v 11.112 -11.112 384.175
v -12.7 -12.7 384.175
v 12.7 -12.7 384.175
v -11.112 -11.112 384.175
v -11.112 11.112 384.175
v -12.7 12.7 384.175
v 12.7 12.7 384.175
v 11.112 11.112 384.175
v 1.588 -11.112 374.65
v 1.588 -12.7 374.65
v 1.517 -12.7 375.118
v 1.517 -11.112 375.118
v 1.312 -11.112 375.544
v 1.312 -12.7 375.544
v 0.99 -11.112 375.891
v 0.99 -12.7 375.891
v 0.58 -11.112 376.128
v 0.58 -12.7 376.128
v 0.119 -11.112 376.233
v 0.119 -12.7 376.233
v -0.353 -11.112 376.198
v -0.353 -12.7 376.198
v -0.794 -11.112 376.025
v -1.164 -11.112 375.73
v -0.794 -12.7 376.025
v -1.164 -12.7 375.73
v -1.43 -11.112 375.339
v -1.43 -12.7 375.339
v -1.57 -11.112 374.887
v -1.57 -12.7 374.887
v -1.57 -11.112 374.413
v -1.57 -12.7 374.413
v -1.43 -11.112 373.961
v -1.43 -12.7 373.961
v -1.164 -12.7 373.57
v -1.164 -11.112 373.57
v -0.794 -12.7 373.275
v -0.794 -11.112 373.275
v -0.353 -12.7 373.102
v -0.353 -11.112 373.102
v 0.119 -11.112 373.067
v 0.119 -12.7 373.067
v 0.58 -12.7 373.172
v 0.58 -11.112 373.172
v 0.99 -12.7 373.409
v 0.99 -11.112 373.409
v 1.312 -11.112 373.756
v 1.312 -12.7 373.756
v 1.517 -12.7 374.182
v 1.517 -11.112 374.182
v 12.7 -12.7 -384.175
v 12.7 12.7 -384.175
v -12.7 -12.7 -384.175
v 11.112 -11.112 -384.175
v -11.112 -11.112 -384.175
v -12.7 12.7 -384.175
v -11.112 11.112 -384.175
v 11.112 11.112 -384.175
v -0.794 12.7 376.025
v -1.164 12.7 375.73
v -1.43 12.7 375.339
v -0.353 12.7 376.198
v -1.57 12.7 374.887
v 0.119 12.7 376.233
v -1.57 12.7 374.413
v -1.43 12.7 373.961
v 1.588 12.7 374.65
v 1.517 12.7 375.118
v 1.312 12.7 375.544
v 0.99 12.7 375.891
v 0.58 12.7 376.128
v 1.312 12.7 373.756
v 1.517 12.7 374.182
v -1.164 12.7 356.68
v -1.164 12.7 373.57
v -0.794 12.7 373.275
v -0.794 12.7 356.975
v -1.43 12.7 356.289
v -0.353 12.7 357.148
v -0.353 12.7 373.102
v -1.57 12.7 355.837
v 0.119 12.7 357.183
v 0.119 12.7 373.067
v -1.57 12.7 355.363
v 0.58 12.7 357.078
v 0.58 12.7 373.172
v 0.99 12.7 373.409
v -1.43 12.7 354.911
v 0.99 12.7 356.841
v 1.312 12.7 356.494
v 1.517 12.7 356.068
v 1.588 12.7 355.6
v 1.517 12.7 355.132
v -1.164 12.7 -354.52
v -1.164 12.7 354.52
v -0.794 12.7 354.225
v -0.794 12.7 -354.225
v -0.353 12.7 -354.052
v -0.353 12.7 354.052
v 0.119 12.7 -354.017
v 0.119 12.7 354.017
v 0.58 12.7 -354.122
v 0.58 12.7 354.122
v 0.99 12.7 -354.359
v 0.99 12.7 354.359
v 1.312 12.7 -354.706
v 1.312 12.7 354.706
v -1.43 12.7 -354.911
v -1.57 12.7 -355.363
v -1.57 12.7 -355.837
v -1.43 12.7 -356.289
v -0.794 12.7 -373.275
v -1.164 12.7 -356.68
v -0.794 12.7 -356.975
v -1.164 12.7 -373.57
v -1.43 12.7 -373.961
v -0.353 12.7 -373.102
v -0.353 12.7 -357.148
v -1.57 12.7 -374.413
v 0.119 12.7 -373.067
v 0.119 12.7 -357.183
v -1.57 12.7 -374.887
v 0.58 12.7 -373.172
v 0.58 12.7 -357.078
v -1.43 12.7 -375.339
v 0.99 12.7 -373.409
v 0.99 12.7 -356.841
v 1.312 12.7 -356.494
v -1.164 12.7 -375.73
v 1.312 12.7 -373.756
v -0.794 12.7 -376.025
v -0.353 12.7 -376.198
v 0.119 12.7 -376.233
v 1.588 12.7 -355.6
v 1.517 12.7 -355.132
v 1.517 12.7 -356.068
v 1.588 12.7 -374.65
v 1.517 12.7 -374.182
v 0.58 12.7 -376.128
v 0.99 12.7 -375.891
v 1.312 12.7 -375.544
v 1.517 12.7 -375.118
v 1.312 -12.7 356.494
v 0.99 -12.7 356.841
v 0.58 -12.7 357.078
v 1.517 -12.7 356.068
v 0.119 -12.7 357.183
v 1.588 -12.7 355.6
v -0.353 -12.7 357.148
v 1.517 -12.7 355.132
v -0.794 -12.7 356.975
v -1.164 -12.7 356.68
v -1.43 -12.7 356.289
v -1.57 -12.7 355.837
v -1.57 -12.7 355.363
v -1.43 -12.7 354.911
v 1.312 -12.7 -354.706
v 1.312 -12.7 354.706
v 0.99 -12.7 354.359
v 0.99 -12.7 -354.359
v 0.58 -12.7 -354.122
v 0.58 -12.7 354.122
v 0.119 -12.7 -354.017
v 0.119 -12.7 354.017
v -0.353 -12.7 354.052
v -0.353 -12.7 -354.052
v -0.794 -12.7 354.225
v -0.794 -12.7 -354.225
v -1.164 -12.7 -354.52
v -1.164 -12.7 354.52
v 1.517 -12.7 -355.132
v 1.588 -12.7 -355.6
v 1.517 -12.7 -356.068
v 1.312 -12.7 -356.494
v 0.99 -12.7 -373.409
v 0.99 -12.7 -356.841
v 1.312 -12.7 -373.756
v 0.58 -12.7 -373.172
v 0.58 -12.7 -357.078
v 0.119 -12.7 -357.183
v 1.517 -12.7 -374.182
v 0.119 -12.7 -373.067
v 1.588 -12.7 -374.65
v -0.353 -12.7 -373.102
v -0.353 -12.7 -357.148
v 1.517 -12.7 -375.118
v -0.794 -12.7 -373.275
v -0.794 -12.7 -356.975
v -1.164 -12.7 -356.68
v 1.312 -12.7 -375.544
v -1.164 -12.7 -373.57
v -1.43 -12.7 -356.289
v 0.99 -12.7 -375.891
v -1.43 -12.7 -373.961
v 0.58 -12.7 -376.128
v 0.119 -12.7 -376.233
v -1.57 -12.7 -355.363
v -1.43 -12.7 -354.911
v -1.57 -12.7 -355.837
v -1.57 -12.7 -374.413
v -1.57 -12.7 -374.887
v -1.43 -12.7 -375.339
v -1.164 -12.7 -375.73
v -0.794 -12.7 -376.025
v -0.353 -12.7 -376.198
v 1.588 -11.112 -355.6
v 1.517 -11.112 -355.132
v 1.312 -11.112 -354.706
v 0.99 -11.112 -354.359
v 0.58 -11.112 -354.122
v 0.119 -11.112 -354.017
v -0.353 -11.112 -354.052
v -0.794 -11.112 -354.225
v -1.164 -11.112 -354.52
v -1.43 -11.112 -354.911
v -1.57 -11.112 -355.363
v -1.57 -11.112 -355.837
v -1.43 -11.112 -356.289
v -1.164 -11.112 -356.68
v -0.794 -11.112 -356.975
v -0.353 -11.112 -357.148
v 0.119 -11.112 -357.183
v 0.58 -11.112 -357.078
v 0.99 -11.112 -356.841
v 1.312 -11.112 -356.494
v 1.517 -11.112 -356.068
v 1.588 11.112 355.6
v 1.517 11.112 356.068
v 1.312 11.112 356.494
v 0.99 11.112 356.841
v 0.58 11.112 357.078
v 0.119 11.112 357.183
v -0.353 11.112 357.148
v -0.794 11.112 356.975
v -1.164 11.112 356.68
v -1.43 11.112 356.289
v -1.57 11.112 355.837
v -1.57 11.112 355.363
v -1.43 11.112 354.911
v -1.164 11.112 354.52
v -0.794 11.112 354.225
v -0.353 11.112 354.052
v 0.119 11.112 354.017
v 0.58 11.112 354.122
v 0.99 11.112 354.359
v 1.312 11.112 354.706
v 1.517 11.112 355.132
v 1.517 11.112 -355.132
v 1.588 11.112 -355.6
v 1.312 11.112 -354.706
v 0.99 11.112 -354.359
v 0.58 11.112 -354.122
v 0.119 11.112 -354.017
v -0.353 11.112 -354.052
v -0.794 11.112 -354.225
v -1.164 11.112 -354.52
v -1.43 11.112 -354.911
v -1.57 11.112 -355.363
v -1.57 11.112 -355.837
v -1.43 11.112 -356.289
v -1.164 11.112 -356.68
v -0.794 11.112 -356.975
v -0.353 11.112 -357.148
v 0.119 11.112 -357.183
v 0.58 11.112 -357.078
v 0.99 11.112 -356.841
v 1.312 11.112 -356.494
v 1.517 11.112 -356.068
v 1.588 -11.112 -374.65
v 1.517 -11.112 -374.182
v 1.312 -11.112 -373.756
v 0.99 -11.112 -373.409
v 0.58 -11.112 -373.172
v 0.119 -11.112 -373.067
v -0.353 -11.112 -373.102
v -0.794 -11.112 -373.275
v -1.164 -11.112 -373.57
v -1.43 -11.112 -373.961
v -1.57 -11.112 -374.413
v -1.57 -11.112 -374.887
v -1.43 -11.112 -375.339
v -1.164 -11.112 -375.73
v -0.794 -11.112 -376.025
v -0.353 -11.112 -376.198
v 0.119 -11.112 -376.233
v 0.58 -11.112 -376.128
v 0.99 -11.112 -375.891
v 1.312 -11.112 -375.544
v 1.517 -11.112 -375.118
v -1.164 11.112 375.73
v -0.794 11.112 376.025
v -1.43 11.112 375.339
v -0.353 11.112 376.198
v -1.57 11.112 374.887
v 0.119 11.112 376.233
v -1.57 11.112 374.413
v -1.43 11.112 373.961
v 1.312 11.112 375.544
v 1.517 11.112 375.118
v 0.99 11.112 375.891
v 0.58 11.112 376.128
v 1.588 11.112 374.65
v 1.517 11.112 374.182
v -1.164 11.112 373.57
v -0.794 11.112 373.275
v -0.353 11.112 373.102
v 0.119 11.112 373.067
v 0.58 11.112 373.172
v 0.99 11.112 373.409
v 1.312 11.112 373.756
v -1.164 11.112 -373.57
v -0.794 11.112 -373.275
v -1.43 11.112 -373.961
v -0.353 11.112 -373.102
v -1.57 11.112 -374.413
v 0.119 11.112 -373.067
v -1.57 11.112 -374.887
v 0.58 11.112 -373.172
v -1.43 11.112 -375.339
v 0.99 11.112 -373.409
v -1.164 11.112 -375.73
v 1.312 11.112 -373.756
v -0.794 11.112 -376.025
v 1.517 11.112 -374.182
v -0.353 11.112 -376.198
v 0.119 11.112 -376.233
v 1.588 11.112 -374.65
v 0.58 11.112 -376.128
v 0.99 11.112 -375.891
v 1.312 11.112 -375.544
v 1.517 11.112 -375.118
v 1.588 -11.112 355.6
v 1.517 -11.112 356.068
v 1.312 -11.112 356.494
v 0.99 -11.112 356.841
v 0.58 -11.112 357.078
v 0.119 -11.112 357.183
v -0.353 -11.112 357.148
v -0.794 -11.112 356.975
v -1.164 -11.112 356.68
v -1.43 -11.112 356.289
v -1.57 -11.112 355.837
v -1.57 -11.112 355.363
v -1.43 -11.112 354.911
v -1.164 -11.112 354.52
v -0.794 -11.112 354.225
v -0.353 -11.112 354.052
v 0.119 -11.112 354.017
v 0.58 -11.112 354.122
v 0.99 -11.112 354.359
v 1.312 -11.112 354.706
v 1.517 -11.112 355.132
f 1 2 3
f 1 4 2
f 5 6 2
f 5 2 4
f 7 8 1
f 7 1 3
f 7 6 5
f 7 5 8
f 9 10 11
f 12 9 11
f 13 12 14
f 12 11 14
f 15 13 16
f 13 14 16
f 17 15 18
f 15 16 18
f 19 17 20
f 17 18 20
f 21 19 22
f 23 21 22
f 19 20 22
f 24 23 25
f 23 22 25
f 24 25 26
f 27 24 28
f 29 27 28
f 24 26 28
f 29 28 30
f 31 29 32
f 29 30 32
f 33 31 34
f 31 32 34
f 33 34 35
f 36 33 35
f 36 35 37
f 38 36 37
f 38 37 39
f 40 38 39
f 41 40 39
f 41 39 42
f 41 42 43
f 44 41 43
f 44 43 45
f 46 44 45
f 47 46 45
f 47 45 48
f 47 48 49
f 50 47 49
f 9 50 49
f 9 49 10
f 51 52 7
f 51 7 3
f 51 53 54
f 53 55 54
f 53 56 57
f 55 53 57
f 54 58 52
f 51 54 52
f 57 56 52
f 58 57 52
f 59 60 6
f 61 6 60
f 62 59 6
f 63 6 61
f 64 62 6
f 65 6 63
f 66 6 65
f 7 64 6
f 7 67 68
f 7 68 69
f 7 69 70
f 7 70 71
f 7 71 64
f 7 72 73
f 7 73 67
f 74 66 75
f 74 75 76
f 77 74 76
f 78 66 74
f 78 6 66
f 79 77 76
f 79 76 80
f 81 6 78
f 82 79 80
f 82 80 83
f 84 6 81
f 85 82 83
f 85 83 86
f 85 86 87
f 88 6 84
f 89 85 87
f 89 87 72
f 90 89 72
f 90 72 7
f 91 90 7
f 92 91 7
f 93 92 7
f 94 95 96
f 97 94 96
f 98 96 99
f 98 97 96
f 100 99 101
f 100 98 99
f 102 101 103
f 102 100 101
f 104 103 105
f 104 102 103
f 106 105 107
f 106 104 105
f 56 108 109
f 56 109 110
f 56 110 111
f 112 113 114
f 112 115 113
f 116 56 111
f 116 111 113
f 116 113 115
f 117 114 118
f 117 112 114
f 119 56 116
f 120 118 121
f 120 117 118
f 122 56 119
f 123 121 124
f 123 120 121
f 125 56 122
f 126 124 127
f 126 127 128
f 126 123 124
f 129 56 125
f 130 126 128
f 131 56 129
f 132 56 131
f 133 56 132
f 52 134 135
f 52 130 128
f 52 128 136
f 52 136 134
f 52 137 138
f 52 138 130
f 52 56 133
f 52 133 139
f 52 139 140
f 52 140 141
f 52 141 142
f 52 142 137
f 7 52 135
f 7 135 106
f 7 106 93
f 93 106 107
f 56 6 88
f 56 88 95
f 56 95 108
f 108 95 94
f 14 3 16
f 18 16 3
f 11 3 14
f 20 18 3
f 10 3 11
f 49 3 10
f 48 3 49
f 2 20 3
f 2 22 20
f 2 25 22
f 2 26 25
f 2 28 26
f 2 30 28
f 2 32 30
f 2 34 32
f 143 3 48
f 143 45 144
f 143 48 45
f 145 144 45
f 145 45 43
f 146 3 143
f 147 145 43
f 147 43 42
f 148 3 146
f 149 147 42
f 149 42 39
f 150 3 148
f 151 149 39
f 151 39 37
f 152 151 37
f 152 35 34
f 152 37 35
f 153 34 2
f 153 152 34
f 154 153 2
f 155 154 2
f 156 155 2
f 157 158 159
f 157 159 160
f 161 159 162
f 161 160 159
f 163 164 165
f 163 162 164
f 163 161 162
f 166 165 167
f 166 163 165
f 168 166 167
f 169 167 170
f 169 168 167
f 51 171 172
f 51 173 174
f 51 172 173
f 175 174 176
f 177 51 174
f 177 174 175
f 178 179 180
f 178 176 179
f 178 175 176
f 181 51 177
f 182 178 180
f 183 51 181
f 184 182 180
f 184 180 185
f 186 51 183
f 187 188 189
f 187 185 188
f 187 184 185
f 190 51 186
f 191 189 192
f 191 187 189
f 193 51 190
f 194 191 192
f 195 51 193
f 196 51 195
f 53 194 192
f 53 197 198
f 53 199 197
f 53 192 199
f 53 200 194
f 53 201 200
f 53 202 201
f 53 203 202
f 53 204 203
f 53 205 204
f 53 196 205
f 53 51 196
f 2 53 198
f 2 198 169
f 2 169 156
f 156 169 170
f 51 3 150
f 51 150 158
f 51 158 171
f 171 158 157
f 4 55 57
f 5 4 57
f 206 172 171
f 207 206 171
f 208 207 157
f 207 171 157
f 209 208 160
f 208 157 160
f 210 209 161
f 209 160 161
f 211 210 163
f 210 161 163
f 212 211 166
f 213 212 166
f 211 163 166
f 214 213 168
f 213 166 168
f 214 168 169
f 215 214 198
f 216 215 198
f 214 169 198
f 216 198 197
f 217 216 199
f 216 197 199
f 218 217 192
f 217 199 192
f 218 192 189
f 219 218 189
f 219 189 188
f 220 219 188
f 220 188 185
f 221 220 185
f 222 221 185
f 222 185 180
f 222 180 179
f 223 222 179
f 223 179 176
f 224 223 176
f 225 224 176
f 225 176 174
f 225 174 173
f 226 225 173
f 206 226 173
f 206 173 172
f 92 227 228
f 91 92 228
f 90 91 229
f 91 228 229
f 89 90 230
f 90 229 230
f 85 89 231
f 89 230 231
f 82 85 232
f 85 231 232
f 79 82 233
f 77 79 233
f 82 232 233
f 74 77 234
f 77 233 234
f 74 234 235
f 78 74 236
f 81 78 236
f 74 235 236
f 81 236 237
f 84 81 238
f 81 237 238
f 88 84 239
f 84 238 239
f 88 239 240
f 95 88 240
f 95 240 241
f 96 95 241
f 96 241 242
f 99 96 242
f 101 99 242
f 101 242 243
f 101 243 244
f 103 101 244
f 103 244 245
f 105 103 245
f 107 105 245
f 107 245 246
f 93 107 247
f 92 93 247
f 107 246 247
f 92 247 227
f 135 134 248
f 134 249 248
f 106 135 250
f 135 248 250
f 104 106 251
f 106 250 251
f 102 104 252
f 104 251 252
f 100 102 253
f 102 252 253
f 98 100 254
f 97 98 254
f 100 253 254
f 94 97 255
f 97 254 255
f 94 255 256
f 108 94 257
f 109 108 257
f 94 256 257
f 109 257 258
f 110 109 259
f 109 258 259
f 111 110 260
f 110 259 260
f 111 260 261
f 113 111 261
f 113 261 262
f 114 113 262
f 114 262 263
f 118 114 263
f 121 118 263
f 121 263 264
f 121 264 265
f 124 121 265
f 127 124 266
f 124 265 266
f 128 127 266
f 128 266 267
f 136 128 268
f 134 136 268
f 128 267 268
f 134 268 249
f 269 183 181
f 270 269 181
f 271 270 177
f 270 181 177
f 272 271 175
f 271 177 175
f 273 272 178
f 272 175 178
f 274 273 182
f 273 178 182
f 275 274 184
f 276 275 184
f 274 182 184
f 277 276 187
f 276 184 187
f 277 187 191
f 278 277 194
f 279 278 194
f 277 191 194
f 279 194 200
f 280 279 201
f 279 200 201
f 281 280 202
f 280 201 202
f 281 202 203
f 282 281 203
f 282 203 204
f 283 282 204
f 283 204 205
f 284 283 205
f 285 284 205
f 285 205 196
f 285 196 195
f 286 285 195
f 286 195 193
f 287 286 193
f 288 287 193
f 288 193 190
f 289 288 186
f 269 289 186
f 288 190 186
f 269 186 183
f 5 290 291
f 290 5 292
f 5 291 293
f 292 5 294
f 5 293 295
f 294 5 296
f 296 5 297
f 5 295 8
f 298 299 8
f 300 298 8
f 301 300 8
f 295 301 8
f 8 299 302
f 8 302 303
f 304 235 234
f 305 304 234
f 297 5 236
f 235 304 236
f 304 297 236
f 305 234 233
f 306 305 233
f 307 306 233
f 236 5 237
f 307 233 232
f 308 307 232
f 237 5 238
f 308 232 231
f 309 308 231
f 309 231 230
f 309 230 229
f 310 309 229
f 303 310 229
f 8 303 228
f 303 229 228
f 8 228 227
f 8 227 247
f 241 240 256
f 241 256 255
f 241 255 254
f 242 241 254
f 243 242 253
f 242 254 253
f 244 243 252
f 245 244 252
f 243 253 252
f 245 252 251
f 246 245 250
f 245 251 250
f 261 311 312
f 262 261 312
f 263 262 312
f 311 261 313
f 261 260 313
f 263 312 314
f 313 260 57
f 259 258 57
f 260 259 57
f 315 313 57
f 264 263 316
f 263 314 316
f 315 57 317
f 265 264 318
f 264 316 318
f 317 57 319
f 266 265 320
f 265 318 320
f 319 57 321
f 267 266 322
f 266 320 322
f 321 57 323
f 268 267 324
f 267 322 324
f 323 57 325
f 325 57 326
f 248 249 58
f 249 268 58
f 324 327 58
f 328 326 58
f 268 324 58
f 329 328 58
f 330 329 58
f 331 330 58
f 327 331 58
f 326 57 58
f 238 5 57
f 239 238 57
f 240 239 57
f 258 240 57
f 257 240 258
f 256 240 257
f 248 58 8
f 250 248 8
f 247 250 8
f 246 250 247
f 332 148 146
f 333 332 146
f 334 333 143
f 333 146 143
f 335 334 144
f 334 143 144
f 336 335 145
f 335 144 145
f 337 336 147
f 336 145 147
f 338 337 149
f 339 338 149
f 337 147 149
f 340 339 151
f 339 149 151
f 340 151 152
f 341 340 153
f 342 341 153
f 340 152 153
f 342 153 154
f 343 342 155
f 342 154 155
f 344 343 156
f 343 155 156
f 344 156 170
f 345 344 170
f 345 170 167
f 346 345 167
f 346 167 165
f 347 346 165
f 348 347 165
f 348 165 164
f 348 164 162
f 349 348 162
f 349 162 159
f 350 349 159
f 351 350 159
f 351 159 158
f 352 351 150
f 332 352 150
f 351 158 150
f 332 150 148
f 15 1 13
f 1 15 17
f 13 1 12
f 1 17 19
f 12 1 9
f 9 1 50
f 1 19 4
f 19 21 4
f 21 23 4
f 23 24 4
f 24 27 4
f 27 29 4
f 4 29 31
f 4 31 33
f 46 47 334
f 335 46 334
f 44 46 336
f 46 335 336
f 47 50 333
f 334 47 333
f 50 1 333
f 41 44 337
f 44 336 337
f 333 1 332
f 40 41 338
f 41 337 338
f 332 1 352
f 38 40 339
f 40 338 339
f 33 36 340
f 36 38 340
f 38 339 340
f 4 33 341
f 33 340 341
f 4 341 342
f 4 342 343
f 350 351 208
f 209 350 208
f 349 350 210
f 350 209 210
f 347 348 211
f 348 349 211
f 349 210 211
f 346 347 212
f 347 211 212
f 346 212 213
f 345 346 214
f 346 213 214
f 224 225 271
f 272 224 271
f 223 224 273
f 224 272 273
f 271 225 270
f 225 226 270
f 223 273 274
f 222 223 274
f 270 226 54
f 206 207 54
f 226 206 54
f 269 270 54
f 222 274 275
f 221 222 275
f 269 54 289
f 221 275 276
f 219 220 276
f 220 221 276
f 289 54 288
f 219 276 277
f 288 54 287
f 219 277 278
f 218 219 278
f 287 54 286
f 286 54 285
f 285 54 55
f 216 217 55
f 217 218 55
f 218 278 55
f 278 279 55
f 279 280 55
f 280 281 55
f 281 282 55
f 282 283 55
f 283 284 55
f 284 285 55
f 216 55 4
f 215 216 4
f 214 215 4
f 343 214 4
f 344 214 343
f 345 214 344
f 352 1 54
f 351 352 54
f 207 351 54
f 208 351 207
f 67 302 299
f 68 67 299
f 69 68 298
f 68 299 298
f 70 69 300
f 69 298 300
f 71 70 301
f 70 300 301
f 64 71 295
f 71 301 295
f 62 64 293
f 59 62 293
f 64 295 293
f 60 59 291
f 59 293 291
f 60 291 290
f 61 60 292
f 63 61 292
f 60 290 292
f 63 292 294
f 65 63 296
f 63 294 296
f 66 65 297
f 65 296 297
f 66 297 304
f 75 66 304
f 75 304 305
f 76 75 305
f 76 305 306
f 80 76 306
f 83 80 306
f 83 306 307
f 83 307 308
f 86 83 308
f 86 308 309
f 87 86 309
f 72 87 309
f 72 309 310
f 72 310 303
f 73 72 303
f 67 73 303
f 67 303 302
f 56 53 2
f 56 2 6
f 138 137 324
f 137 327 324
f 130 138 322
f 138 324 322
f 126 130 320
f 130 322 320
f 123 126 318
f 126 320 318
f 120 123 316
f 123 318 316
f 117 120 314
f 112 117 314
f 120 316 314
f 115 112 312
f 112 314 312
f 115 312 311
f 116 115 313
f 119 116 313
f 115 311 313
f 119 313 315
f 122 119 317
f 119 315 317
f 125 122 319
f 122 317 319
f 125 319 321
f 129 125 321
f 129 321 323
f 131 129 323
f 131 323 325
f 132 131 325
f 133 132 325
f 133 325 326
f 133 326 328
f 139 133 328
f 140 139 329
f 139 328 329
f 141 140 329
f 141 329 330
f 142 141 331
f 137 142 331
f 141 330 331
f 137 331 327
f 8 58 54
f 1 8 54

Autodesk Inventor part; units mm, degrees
ref_plane "YZ Plane" through (0, 0, 0) normal (1, 0, 0) x (0, 1, 0)
ref_plane "XZ Plane" through (0, 0, 0) normal (0, 1, 0) x (-1, 0, 0)
ref_plane "XY Plane" through (0, 0, 0) normal (0, 0, 1) x (1, 0, 0)
sketch "Sketch1" plane through (0, 0, 0) normal (0, 0, 1) x (1, 0, 0)
  line L0 (0, 0) -> (-11.1125, 0) construction
  line L1 (0, 0) -> (0, 11.1125) construction
  line L2 (-11.1125, 11.1125) -> (11.1125, 11.1125)
  line L3 (11.1125, 11.1125) -> (11.1125, -11.1125)
  line L4 (11.1125, -11.1125) -> (-11.1125, -11.1125)
  line L5 (-11.1125, -11.1125) -> (-11.1125, 11.1125)
  line L6 (-12.7, 12.7) -> (12.7, 12.7)
  line L7 (12.7, 12.7) -> (12.7, -12.7)
  line L8 (12.7, -12.7) -> (-12.7, -12.7)
  line L9 (-12.7, -12.7) -> (-12.7, 12.7)
  line L10 (-11.1125, 0) -> (-12.7, 0) construction
  line L11 (0, 11.1125) -> (0, 12.7) construction
  dimension "d0" = 25.4
  dimension "d1" = 1.5875
extrude "Extrusion1" add sketch "Sketch1" along normal mid plane 768.35
sketch "Sketch3" plane through (-12.7, -12.7, 384.175) normal (0, -1, 0) x (1, 0, 0)
  line L0 (12.7, -384.175) -> (0, -384.175) construction
  line L1 (0, -768.35) -> (0, 0) construction
  line L2 (12.7, -384.175) -> (12.7, 0) construction
  circle A0 centre (12.7, -9.525) radius 1.5875
  circle A1 centre (12.7, -28.575) radius 1.5875
  line L3 (0, 0) -> (25.4, 0) projected
  circle A2 centre (12.7, -758.825) radius 1.5875
  circle A3 centre (12.7, -739.775) radius 1.5875
  dimension "d9" = 3.175
  dimension "d10" = 9.525
  dimension "d11" = 19.05
extrude "Extrusion3" cut sketch "Sketch3" against normal through all
properties part number "Long Side" material "Aluminum 6061"
